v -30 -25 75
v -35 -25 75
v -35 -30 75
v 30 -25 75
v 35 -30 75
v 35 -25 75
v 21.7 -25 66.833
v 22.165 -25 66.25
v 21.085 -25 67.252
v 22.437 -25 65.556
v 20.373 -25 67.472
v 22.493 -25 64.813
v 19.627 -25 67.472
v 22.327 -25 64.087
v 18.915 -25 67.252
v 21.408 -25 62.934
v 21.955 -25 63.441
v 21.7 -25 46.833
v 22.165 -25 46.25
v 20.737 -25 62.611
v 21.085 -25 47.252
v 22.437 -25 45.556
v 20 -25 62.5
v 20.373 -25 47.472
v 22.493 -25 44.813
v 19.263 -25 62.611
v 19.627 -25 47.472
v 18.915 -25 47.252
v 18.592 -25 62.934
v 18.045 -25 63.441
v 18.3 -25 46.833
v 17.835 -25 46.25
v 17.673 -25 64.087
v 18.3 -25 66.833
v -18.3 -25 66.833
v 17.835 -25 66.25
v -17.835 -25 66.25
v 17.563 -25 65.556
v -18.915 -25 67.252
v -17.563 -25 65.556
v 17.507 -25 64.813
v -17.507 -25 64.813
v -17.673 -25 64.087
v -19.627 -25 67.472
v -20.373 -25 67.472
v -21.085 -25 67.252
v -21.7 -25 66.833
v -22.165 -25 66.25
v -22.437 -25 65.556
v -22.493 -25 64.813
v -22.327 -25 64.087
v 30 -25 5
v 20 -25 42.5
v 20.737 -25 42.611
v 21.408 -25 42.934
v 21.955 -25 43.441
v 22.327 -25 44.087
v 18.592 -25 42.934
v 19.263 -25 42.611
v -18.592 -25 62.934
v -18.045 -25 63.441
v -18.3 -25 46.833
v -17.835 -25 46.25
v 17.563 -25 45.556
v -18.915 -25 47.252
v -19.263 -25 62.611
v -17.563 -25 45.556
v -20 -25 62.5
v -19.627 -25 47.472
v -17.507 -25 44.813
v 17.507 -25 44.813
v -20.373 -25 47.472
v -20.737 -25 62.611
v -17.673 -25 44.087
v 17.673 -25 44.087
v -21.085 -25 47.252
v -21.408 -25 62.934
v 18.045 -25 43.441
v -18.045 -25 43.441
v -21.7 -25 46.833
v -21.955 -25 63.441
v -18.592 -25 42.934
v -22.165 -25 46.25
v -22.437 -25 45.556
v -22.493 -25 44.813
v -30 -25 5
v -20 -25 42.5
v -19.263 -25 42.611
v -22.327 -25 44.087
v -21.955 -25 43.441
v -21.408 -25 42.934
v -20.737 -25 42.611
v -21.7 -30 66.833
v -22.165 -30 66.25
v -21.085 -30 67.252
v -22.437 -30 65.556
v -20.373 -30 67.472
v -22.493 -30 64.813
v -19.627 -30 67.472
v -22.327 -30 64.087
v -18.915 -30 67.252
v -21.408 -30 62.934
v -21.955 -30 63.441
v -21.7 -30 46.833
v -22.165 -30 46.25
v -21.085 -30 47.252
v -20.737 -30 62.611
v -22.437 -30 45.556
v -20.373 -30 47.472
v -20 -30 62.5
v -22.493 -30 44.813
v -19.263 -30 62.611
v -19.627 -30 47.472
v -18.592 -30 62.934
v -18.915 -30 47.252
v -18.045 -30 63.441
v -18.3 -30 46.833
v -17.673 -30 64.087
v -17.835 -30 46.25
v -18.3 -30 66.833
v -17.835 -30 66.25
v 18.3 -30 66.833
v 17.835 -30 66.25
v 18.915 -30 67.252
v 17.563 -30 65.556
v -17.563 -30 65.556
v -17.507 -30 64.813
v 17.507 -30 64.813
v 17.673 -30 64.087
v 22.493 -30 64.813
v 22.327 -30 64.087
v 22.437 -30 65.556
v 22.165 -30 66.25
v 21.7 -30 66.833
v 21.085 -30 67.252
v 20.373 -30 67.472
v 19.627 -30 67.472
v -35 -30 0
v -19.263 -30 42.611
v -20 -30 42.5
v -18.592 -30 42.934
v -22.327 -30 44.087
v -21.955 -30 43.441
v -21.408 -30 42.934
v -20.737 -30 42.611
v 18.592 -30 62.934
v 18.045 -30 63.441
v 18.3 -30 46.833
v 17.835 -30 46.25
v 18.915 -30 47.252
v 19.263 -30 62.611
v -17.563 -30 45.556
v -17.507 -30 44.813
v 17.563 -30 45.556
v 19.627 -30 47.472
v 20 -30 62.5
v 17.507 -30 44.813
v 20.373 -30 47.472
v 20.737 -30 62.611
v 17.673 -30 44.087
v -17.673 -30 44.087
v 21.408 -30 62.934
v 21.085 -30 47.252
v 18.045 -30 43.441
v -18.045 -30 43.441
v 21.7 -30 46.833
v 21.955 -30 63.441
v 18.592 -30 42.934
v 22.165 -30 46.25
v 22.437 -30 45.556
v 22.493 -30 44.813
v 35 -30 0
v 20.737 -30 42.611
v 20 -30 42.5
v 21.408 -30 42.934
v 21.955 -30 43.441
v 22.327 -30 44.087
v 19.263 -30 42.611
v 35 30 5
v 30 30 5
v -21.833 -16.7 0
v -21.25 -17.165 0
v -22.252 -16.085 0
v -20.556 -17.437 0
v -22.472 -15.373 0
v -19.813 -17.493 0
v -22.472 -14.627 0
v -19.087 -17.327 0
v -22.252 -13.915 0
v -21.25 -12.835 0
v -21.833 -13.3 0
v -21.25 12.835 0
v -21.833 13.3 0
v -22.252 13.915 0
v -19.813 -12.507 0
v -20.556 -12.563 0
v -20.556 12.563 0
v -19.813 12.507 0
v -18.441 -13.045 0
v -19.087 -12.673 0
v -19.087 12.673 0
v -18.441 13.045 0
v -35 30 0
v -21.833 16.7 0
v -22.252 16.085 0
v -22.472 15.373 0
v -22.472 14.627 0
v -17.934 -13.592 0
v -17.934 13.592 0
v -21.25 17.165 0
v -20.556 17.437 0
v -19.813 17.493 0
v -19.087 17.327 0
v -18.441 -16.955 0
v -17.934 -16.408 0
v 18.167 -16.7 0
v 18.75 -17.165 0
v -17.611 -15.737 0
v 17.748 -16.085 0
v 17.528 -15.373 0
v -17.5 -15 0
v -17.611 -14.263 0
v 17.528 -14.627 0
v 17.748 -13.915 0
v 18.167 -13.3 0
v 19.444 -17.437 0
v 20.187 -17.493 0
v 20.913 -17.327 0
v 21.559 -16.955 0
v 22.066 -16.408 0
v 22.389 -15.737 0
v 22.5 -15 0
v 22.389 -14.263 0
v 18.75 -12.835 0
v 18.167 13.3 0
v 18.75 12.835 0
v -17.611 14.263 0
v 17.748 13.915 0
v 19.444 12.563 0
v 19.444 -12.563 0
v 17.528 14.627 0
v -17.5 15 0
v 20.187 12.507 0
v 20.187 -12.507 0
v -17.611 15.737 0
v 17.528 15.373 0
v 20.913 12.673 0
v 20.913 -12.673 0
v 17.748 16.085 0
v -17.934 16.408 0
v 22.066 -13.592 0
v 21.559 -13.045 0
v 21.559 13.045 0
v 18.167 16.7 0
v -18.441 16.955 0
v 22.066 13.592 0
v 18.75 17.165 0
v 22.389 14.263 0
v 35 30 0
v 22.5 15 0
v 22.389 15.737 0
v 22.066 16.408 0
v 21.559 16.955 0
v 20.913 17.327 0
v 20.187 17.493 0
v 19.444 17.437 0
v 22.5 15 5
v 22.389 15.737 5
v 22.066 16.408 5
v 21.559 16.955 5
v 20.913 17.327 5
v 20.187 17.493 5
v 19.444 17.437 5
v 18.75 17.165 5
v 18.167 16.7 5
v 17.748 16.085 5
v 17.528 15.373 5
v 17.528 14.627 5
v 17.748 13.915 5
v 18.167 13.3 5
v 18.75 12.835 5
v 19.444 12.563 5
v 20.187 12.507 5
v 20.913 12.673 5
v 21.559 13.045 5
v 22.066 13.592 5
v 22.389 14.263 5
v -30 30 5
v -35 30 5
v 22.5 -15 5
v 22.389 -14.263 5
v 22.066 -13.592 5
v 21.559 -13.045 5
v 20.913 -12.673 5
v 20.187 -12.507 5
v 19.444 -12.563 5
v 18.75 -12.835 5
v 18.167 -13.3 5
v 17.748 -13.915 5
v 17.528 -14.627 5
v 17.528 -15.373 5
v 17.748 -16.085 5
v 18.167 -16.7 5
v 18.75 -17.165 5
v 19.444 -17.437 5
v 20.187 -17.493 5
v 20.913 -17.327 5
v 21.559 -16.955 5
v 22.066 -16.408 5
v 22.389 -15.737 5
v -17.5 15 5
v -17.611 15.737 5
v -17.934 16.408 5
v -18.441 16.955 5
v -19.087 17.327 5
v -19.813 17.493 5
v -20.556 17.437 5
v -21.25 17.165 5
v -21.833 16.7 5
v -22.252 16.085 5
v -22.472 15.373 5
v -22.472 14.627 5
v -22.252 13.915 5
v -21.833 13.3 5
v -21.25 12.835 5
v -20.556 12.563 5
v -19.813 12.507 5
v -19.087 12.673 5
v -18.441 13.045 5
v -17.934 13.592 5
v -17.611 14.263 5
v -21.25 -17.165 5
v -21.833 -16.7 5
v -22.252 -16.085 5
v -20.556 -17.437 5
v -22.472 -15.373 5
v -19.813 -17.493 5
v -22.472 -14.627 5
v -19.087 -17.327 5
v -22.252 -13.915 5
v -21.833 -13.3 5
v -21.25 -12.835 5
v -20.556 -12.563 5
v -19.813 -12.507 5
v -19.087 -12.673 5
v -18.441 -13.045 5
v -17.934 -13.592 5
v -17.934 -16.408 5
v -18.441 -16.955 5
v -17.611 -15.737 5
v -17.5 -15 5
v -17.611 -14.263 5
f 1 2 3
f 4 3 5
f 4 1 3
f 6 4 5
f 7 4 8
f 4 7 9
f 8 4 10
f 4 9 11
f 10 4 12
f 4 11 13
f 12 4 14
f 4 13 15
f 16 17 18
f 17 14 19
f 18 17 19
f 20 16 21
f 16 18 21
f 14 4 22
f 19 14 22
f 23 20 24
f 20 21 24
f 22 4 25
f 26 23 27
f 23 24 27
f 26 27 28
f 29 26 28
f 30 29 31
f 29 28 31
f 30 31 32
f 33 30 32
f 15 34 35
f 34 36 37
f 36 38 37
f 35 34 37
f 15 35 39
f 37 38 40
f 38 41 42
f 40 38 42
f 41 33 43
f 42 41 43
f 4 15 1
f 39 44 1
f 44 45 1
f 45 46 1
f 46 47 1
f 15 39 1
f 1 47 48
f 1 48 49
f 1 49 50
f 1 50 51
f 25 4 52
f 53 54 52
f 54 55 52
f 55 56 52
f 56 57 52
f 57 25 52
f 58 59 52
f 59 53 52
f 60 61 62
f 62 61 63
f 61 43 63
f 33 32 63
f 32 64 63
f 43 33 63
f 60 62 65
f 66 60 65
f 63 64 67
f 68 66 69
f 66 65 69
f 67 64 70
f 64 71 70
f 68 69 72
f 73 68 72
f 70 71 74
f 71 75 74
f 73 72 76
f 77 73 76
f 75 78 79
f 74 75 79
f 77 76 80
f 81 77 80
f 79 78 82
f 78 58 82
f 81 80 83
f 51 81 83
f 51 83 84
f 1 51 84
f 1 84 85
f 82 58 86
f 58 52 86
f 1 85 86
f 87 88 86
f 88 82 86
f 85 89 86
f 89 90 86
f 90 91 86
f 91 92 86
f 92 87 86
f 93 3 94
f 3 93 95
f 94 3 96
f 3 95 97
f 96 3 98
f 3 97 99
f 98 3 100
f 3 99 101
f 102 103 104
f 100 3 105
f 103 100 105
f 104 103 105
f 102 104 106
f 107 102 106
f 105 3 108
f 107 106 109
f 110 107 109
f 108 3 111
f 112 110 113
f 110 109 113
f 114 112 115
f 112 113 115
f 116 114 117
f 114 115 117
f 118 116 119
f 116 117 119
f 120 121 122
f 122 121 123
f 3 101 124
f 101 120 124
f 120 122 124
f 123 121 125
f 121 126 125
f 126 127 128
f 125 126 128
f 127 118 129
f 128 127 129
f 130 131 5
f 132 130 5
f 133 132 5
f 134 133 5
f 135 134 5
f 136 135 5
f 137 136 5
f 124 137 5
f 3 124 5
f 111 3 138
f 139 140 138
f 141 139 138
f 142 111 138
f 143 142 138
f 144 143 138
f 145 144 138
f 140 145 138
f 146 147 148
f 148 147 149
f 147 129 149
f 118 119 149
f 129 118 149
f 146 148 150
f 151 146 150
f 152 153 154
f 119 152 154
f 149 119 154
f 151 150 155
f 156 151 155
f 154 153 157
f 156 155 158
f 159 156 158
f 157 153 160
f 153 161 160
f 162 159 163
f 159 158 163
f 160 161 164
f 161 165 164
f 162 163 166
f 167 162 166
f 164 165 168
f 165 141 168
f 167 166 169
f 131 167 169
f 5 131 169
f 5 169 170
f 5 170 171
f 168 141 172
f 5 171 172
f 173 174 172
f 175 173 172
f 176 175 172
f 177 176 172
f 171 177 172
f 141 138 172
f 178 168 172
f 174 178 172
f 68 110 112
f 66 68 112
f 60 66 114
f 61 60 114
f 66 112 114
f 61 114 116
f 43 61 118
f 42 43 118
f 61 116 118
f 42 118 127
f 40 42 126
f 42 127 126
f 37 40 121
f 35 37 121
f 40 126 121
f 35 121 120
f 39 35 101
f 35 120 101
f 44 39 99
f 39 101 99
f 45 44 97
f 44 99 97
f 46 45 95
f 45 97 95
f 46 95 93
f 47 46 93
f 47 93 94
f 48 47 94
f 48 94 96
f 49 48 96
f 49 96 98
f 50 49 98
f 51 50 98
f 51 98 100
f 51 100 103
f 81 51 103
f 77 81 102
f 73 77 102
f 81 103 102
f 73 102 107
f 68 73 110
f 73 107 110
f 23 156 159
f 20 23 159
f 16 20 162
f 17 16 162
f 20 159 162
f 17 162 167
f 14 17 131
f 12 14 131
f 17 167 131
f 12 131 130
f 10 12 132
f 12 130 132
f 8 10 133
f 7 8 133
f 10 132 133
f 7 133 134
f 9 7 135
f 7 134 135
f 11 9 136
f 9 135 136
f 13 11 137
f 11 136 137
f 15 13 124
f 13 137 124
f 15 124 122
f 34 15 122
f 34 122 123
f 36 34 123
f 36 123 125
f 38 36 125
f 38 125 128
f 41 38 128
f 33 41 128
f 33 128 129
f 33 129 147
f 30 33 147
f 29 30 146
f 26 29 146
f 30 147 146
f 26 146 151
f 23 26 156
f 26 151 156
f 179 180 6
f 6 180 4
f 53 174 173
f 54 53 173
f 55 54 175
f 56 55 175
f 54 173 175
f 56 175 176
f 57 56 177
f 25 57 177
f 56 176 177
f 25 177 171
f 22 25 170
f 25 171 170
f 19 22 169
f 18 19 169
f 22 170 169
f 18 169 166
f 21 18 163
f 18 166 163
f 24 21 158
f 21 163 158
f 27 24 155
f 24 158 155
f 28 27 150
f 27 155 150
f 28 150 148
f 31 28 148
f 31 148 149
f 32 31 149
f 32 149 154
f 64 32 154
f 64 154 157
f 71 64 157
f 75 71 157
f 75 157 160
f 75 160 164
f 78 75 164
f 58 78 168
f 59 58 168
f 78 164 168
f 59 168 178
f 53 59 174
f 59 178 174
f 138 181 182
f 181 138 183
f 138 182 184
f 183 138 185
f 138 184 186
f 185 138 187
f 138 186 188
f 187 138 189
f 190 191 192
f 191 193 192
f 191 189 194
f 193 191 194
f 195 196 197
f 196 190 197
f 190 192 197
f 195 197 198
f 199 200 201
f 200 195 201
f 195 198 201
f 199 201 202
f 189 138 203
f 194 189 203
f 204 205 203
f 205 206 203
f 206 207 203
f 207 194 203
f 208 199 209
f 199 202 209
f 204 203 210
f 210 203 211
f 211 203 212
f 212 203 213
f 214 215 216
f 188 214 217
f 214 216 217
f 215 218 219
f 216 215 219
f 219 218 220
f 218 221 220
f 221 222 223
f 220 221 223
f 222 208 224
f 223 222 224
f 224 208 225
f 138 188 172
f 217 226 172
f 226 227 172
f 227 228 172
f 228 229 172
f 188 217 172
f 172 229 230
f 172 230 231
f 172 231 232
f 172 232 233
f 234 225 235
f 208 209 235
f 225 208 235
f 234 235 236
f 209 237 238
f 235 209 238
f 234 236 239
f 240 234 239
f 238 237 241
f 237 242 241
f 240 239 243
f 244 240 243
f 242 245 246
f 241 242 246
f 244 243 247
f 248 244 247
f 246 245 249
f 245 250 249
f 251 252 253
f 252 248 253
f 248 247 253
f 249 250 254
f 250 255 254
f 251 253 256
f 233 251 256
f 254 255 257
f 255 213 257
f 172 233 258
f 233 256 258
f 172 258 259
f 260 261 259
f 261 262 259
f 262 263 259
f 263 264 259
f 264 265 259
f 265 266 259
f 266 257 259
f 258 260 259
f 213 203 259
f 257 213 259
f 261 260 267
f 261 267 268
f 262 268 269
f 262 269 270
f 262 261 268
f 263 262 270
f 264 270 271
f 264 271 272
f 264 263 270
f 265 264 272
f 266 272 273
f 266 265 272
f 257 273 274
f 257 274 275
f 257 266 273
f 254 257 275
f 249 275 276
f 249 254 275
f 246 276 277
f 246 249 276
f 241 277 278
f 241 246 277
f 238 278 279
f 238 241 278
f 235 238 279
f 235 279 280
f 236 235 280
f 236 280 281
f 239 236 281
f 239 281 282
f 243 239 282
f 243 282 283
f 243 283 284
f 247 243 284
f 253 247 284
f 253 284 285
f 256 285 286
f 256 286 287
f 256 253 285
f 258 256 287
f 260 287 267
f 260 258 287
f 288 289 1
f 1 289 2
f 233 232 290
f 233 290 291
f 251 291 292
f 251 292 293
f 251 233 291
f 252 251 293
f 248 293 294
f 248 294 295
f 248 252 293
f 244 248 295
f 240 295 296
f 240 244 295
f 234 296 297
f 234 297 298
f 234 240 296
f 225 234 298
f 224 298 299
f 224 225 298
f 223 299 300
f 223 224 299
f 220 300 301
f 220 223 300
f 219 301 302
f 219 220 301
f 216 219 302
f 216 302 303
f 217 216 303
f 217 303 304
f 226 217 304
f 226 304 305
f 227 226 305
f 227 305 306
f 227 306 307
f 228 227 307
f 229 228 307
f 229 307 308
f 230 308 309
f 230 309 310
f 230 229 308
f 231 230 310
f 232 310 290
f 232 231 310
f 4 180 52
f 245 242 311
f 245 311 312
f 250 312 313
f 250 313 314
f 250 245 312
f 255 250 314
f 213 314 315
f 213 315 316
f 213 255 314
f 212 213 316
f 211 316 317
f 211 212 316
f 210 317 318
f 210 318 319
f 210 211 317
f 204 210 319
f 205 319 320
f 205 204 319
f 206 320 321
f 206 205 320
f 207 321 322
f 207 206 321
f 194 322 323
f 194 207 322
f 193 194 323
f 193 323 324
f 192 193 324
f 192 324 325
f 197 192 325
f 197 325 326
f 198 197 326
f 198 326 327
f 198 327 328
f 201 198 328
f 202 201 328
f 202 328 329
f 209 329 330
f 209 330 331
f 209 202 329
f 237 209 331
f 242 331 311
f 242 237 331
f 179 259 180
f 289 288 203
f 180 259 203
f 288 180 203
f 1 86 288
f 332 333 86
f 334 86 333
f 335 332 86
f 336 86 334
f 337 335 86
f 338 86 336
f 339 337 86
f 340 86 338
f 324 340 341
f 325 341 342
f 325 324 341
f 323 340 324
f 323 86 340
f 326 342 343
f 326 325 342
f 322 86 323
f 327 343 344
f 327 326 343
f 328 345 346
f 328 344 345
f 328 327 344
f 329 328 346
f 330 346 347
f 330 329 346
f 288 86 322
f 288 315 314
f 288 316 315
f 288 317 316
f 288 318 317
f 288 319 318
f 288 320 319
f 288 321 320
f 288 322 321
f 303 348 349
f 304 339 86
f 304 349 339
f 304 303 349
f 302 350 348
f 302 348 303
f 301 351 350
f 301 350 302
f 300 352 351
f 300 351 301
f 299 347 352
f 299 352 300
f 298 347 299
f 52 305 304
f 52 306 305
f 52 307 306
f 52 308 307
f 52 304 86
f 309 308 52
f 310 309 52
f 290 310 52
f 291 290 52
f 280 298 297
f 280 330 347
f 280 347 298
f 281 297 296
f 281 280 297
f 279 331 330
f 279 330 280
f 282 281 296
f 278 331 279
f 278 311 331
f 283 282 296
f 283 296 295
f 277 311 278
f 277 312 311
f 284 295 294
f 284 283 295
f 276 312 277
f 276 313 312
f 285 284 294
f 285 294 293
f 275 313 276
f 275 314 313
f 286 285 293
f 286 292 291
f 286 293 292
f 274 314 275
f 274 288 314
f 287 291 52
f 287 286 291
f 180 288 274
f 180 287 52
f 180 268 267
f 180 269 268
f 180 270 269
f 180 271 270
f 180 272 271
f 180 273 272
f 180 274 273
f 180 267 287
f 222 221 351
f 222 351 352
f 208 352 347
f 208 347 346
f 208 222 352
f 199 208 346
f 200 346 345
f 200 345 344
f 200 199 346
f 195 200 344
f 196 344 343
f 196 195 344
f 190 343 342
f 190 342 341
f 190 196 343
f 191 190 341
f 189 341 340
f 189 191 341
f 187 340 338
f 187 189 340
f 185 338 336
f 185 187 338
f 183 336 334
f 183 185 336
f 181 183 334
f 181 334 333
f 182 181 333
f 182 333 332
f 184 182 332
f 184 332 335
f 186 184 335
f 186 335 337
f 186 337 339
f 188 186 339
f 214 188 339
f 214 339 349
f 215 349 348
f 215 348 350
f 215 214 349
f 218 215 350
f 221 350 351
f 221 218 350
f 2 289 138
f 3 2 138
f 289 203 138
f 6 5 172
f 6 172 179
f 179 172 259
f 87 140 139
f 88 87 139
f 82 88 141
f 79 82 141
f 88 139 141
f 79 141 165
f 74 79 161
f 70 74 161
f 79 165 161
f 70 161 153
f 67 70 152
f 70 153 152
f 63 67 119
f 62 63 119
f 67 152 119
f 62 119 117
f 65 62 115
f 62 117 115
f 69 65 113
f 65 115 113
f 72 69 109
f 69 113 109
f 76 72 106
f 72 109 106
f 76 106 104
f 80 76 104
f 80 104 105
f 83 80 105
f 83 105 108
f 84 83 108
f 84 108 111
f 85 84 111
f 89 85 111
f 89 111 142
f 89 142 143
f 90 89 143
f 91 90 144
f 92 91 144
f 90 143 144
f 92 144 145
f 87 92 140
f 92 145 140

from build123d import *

# Parameters (mm, degrees)
SKETCH_1_W          = 70
SKETCH_1_H          = 60
SKETCH_1_R          = 2.5
EXTRUDE_1_DEPTH     = 5
EXTRUDE_2_DEPTH     = 70
CUT_EXTRUDE_1_DEPTH = 70
SKETCH_4_R          = 2.5
CUT_EXTRUDE_2_DEPTH = 5


with BuildPart() as part:
    # 草图1 → 凸台-拉伸1 (new body)
    with BuildSketch(Plane.XY):
        Rectangle(SKETCH_1_W, SKETCH_1_H)
        with Locations((-20, 15)):
            Circle(SKETCH_1_R, mode=Mode.SUBTRACT)
        with Locations((20, 15)):
            Circle(SKETCH_1_R, mode=Mode.SUBTRACT)
        with Locations((-20, -15)):
            Circle(SKETCH_1_R, mode=Mode.SUBTRACT)
        with Locations((20, -15)):
            Circle(SKETCH_1_R, mode=Mode.SUBTRACT)
    extrude(amount=EXTRUDE_1_DEPTH)

    # 草图2 → 凸台-拉伸2 (add)
    with BuildSketch(Plane.XY.offset(5)):
        Polygon((-30, 30), (-35, 30), (-35, -30), (35, -30), (35, 30), (30, 30), (30, -25), (-30, -25), align=None)
    extrude(amount=EXTRUDE_2_DEPTH)

    # 草图3 → 切除-拉伸1 (cut)
    with BuildSketch(Plane.ZY.offset(35)):
        Polygon((5, 30), (75, -25), (75, 30), align=None)
    extrude(amount=-CUT_EXTRUDE_1_DEPTH, mode=Mode.SUBTRACT)

    # 草图4 → 切除-拉伸2 (cut)
    with BuildSketch(Plane.XZ.offset(30)):
        with Locations(Location((-20, 65, 0), (0, 0, 270))):
            Circle(SKETCH_4_R)
        with Locations(Location((20, 65, 0), (0, 0, 270))):
            Circle(SKETCH_4_R)
        with Locations(Location((-20, 45, 0), (0, 0, 270))):
            Circle(SKETCH_4_R)
        with Locations(Location((20, 45, 0), (0, 0, 270))):
            Circle(SKETCH_4_R)
    extrude(amount=-CUT_EXTRUDE_2_DEPTH, mode=Mode.SUBTRACT)


solid = part.part
